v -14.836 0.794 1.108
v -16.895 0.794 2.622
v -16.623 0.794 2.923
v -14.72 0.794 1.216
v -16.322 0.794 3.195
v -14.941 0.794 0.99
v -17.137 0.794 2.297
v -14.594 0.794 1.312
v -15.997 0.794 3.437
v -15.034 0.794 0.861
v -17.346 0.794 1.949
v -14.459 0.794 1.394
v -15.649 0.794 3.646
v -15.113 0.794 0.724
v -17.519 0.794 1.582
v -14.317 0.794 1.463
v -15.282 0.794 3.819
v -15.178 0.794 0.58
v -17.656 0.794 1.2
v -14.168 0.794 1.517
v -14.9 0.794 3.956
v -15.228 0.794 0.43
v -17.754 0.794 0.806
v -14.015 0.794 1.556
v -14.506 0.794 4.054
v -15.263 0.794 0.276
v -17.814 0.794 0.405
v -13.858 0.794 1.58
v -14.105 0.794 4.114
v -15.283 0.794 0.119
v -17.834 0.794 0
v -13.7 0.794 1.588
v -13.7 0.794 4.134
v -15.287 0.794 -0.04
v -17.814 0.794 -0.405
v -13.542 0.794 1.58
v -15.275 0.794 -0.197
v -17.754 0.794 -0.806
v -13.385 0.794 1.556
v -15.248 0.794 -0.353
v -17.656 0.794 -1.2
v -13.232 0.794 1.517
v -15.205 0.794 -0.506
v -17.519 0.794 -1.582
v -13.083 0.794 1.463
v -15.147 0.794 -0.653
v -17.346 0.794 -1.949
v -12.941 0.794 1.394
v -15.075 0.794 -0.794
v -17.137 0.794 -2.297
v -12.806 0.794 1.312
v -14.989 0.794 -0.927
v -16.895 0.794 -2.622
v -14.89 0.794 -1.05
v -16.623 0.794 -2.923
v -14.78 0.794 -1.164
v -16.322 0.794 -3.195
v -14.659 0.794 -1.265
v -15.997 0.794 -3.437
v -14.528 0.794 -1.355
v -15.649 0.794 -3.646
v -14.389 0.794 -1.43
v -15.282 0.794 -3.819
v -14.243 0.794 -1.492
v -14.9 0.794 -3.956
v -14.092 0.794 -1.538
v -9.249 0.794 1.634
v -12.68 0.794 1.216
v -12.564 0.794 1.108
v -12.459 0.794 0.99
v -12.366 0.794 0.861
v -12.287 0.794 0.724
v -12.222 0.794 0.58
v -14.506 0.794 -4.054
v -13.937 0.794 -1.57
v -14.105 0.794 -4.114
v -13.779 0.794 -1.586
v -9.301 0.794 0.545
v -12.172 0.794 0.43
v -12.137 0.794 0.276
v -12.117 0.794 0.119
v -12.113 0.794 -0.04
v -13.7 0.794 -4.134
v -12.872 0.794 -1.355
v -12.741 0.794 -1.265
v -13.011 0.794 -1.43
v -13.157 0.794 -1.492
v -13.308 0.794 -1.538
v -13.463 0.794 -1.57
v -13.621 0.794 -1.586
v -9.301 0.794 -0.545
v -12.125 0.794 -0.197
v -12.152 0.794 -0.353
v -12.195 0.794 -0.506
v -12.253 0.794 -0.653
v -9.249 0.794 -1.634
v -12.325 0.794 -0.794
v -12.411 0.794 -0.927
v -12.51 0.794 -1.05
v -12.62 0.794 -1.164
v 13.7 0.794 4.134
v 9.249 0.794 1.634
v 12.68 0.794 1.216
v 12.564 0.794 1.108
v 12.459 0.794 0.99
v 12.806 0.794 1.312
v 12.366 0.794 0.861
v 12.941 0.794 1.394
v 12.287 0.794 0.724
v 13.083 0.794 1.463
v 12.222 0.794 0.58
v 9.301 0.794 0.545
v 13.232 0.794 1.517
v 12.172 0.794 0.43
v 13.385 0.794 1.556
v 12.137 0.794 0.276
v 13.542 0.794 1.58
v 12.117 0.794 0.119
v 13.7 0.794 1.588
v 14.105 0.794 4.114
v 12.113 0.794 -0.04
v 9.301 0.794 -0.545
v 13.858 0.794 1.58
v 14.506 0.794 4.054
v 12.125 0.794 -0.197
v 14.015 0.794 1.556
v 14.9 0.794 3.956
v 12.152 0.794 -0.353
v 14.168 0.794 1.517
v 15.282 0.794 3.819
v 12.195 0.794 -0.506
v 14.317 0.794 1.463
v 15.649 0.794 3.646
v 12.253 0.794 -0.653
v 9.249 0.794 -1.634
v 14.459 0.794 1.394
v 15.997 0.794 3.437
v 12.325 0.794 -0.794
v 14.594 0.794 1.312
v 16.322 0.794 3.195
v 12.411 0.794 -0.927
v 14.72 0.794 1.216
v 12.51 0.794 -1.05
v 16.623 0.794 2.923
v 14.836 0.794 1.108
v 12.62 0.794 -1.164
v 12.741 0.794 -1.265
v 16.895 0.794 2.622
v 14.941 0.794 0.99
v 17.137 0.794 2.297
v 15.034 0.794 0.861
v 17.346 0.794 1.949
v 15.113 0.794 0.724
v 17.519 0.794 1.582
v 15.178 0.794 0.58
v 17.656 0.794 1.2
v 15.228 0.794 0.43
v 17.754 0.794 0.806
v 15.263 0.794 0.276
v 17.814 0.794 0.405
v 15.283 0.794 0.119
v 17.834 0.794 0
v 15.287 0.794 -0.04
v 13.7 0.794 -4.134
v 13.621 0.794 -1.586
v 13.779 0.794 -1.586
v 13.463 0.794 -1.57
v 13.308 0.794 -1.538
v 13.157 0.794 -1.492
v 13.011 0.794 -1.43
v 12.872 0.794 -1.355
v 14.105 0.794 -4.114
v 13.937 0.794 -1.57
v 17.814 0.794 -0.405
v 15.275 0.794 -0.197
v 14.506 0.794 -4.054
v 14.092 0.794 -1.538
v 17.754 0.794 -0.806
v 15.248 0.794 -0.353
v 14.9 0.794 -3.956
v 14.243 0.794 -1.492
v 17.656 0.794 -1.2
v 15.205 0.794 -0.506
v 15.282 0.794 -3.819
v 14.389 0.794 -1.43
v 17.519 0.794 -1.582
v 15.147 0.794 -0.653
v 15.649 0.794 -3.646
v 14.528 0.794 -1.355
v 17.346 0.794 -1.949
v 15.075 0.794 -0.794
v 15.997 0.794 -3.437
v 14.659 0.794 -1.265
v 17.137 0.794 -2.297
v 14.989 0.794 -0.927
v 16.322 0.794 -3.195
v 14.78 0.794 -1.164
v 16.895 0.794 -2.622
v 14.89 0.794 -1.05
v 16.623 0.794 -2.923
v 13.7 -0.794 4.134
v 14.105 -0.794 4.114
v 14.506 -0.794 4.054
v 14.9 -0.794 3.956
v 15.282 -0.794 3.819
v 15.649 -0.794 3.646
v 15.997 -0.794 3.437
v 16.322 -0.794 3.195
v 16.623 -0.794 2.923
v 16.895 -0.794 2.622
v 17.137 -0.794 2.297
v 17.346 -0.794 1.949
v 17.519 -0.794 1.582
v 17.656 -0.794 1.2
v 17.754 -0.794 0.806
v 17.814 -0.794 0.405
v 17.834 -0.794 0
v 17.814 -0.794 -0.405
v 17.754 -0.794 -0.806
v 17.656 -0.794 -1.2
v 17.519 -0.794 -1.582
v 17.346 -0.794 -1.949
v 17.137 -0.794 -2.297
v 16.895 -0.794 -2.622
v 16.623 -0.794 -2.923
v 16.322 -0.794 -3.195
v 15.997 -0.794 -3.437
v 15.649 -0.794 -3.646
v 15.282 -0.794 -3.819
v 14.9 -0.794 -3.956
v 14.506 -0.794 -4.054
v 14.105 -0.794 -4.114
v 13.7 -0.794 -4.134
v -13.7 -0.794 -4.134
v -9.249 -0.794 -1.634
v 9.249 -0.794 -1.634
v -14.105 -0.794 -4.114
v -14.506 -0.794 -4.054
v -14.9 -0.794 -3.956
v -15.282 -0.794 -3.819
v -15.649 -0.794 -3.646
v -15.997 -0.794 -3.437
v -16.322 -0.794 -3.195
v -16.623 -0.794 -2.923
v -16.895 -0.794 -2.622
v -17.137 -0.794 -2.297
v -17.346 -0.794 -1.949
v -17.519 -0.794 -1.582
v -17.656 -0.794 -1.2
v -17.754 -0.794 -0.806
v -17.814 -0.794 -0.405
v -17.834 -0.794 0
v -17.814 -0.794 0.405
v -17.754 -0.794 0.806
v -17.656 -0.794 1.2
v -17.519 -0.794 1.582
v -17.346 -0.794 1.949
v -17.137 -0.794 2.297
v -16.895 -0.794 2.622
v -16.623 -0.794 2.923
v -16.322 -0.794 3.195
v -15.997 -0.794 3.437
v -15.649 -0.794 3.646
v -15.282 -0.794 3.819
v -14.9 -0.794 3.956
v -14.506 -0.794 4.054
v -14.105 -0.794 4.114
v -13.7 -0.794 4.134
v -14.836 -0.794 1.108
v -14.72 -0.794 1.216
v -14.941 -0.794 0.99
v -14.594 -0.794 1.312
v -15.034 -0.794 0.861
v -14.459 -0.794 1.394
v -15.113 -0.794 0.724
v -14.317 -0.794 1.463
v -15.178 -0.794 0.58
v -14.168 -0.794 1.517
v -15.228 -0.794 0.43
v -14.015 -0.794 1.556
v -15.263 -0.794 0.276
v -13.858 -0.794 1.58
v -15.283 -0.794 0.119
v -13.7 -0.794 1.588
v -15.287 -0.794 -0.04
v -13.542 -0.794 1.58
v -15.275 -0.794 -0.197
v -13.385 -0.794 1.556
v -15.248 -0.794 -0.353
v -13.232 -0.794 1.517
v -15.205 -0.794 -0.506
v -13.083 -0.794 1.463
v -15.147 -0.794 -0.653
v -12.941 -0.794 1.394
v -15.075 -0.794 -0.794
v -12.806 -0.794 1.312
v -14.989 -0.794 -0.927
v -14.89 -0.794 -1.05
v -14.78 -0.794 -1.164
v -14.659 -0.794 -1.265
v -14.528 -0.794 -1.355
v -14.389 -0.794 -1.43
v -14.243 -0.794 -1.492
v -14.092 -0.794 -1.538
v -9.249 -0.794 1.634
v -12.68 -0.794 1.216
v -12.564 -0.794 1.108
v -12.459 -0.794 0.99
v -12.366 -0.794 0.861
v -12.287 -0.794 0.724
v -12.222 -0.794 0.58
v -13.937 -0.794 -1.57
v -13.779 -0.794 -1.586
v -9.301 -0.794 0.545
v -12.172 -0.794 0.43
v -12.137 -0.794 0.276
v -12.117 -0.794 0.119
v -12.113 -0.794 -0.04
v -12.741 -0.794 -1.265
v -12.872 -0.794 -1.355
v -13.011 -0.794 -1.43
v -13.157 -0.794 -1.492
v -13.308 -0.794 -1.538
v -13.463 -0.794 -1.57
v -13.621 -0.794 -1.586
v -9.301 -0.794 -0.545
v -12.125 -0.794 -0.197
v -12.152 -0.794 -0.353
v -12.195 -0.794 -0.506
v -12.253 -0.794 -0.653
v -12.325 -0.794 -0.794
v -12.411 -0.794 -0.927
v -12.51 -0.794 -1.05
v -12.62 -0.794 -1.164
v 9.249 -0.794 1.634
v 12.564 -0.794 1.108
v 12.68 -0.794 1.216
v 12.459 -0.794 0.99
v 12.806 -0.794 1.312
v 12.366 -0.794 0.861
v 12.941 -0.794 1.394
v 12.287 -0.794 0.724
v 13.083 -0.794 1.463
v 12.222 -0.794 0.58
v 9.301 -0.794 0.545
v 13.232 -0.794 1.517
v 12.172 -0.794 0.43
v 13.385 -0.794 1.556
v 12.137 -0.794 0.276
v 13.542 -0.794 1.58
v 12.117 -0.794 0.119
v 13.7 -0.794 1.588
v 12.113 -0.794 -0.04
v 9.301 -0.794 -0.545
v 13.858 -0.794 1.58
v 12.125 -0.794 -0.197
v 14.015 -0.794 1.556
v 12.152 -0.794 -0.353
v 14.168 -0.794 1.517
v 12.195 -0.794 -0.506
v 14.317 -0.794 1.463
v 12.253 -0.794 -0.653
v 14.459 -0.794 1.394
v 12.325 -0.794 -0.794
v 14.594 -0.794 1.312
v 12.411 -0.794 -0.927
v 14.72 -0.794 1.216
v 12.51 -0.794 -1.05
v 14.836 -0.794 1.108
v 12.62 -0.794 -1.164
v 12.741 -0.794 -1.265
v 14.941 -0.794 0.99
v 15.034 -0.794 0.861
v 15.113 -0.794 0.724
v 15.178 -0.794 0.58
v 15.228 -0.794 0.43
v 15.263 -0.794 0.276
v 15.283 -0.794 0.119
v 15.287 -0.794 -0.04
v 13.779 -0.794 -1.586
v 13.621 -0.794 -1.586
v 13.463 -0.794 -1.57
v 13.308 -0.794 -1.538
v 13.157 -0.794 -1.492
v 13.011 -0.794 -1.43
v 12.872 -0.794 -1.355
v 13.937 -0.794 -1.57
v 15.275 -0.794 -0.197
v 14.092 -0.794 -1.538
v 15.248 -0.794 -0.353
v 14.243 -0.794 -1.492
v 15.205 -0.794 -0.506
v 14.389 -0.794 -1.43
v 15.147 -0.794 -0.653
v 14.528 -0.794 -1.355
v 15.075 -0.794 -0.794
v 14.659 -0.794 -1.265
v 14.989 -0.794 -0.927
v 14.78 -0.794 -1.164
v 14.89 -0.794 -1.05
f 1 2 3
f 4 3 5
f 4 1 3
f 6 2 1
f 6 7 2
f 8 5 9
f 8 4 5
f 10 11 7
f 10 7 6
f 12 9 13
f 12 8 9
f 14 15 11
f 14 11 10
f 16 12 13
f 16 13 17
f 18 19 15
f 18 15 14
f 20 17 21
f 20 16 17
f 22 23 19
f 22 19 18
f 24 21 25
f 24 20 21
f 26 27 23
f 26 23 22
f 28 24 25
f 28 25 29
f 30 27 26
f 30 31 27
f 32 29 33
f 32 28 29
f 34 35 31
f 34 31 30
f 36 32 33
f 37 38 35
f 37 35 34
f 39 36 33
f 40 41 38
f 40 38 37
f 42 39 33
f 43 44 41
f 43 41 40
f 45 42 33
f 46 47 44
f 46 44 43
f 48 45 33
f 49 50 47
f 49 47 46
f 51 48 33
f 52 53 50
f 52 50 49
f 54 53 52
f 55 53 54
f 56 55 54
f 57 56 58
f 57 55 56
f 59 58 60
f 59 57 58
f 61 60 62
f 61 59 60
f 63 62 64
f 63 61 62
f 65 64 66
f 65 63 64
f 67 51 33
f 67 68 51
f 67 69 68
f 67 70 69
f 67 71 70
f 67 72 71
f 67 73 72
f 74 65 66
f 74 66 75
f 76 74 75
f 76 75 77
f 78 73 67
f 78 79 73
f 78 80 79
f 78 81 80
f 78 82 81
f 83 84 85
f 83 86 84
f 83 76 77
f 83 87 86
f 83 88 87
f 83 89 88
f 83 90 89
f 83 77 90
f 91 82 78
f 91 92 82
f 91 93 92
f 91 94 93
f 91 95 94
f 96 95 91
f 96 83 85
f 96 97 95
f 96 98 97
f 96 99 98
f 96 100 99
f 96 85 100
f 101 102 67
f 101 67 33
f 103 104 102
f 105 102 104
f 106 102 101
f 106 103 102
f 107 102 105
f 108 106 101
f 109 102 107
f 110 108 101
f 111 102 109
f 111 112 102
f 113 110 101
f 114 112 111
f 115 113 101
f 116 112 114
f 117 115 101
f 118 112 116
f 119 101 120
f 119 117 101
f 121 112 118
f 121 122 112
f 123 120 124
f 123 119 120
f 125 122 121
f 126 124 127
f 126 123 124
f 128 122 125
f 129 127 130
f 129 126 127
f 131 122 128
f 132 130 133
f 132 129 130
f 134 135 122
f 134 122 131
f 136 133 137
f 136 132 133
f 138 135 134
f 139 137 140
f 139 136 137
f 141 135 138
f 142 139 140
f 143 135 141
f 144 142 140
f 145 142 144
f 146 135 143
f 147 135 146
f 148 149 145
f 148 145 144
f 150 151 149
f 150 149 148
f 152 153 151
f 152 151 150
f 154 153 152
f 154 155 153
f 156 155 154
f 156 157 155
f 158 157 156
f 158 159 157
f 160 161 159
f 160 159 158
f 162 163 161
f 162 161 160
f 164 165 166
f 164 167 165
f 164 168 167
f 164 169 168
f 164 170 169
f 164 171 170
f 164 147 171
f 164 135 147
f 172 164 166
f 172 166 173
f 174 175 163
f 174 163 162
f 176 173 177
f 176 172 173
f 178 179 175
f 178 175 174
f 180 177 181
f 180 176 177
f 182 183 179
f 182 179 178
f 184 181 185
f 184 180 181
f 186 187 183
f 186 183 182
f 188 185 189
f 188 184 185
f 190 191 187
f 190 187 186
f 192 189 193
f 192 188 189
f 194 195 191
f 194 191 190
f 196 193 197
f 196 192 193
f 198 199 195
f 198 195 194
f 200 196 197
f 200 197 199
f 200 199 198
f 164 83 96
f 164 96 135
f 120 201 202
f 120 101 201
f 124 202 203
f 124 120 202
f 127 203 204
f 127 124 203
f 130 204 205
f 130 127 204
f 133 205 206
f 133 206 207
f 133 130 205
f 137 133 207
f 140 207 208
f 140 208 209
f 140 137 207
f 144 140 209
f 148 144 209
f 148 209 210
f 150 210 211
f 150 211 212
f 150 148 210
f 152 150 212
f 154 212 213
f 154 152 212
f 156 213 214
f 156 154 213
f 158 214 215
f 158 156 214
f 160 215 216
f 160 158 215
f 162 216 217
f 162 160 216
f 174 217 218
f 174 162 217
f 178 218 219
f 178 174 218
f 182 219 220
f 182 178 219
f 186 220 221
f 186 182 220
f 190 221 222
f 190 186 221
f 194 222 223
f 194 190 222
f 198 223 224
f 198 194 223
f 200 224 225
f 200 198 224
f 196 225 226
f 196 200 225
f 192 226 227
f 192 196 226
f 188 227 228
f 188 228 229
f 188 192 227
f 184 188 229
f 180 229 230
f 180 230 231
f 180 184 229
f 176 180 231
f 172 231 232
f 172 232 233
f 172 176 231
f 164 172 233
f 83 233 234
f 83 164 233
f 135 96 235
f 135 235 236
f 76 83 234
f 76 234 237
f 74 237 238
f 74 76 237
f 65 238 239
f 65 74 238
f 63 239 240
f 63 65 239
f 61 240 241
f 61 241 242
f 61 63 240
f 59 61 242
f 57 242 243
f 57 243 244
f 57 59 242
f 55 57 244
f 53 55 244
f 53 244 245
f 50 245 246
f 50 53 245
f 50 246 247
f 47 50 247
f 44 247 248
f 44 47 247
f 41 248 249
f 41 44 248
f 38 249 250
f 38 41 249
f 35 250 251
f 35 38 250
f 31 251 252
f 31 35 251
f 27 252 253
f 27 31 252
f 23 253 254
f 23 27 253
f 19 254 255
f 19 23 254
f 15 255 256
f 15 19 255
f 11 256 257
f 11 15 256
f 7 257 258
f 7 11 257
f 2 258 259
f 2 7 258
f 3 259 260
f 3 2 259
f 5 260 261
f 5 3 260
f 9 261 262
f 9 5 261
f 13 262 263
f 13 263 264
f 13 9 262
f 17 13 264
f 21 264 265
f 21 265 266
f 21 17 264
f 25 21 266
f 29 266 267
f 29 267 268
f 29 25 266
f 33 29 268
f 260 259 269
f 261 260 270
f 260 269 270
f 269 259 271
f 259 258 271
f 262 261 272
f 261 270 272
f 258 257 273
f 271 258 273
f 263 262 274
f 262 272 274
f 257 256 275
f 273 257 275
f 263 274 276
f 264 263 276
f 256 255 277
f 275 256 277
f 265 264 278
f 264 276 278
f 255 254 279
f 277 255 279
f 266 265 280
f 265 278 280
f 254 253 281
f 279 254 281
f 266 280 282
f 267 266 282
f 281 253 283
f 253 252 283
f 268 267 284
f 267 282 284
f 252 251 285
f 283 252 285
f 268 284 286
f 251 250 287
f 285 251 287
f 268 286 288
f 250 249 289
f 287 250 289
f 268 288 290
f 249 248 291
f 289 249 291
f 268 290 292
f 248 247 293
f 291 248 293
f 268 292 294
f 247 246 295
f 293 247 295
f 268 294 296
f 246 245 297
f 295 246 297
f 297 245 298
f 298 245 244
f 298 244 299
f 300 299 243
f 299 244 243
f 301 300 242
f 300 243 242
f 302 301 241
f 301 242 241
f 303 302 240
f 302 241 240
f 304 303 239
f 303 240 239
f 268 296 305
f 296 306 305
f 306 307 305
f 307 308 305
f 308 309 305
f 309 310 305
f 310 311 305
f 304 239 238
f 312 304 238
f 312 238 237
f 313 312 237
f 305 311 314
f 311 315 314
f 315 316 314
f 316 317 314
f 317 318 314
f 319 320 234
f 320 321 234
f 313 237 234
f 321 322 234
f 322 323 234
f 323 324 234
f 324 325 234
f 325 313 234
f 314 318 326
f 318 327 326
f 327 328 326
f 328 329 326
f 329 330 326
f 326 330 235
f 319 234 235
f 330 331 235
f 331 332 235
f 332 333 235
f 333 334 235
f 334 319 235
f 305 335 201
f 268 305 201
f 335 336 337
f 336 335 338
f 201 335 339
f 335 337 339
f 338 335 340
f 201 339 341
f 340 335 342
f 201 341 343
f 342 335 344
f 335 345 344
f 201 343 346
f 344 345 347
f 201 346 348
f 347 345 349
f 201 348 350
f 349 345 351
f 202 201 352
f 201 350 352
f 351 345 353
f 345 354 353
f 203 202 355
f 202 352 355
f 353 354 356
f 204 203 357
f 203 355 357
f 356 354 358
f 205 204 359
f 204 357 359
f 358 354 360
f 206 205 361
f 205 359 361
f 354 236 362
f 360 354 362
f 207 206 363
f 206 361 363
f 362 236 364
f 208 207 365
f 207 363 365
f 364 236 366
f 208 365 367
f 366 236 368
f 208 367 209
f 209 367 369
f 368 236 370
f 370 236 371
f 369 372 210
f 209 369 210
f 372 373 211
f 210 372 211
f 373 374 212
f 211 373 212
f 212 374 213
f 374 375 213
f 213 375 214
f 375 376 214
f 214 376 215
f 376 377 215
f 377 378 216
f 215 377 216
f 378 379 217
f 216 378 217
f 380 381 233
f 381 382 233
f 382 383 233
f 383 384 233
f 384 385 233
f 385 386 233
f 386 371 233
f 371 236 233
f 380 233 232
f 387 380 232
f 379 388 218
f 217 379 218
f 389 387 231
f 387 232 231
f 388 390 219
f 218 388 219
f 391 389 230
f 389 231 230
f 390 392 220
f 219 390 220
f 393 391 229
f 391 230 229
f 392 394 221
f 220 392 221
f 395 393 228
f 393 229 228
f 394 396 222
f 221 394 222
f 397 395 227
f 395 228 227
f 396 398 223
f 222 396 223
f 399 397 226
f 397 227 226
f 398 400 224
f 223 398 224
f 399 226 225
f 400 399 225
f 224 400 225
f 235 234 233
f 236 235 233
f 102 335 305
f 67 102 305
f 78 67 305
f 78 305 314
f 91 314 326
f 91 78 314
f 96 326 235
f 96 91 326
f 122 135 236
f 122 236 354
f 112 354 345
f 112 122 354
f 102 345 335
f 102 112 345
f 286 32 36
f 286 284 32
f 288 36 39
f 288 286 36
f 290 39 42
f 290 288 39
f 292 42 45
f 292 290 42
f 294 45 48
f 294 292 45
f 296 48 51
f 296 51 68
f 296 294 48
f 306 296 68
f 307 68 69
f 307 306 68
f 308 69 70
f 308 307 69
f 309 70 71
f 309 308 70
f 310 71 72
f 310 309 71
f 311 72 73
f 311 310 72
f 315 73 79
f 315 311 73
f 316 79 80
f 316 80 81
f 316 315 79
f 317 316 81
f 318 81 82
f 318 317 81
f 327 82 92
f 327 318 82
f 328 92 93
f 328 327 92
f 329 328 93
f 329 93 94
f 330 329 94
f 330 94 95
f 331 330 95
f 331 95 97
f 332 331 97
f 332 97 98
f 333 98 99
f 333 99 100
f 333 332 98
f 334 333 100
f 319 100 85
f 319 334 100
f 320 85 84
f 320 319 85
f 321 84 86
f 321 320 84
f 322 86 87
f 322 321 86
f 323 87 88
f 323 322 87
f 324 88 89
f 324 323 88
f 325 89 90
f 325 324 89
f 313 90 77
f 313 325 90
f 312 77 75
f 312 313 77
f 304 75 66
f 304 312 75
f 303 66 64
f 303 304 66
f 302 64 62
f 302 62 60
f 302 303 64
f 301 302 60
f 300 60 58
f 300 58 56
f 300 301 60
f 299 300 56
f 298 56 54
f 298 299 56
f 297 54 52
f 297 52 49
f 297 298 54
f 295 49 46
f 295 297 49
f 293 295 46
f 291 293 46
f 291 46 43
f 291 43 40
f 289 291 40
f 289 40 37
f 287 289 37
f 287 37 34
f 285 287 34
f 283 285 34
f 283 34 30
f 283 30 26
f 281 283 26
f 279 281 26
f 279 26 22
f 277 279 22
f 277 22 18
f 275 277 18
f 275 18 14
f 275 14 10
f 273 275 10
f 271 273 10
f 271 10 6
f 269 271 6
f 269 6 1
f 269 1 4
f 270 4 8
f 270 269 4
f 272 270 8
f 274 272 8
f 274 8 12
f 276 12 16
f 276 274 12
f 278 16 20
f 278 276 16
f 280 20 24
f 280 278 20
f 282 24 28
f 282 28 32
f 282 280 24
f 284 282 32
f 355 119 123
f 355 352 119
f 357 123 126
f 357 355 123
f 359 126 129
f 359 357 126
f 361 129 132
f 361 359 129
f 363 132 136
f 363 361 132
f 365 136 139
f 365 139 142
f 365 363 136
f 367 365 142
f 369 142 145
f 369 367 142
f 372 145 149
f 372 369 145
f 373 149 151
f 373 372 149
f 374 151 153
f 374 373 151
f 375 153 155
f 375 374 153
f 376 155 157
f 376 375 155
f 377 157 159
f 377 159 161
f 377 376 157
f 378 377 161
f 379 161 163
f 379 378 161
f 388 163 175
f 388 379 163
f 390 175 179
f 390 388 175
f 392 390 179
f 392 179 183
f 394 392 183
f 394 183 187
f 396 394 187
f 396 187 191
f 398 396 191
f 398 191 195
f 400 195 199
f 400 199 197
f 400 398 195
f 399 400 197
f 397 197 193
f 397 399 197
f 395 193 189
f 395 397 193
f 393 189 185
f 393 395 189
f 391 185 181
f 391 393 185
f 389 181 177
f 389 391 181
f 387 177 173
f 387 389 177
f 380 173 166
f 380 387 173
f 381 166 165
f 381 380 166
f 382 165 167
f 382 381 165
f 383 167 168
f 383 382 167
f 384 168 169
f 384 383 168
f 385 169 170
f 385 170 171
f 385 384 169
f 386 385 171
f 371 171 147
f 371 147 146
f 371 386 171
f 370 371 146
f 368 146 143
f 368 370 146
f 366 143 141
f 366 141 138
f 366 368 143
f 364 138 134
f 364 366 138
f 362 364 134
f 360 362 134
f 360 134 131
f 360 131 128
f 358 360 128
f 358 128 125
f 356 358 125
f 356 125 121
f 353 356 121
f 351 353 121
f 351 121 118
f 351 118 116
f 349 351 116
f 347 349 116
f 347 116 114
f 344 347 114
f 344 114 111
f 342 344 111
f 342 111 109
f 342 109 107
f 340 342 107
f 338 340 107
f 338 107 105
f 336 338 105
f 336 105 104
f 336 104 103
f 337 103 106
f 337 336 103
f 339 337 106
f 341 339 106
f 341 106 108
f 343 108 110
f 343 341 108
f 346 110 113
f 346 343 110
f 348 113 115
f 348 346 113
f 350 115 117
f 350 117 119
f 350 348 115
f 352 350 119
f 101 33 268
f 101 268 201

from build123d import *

# Parameters (mm, degrees)
SKETCH1_R           = 1.5875
BOSS_EXTRUDE2_DEPTH = 0.79375


with BuildPart() as part:
    # Sketch1 → Boss-Extrude2 (new, symmetric)
    with BuildSketch(Plane(origin=(0, 0, 0), x_dir=(1, 0, 0), z_dir=(0, 1, 0))):
        with BuildLine():
            Line((13.7, 4.133736316), (-13.7, 4.133736316))
            ThreePointArc((-13.7, 4.133736316), (-17.833736316, 0), (-13.7, -4.133736316))
            Line((-13.7, -4.133736316), (13.7, -4.133736316))
            ThreePointArc((13.7, -4.133736316), (17.833736316, 0), (13.7, 4.133736316))
        make_face()
        with Locations(Location((13.7, 0, 0), (0, 0, 270))):
            Circle(SKETCH1_R, mode=Mode.SUBTRACT)
        with Locations(Location((-13.7, 0, 0), (0, 0, 270))):
            Circle(SKETCH1_R, mode=Mode.SUBTRACT)
        with BuildLine():
            Line((9.249344571, -1.633736316), (-9.249344571, -1.633736316))
            ThreePointArc((-9.249344571, -1.633736316), (-9.307422945, 0), (-9.249344571, 1.633736316))
            Line((-9.249344571, 1.633736316), (9.249344571, 1.633736316))
            ThreePointArc((9.249344571, 1.633736316), (9.307422945, 0), (9.249344571, -1.633736316))
        make_face(mode=Mode.SUBTRACT)
    extrude(amount=BOSS_EXTRUDE2_DEPTH, both=True)


solid = part.part
